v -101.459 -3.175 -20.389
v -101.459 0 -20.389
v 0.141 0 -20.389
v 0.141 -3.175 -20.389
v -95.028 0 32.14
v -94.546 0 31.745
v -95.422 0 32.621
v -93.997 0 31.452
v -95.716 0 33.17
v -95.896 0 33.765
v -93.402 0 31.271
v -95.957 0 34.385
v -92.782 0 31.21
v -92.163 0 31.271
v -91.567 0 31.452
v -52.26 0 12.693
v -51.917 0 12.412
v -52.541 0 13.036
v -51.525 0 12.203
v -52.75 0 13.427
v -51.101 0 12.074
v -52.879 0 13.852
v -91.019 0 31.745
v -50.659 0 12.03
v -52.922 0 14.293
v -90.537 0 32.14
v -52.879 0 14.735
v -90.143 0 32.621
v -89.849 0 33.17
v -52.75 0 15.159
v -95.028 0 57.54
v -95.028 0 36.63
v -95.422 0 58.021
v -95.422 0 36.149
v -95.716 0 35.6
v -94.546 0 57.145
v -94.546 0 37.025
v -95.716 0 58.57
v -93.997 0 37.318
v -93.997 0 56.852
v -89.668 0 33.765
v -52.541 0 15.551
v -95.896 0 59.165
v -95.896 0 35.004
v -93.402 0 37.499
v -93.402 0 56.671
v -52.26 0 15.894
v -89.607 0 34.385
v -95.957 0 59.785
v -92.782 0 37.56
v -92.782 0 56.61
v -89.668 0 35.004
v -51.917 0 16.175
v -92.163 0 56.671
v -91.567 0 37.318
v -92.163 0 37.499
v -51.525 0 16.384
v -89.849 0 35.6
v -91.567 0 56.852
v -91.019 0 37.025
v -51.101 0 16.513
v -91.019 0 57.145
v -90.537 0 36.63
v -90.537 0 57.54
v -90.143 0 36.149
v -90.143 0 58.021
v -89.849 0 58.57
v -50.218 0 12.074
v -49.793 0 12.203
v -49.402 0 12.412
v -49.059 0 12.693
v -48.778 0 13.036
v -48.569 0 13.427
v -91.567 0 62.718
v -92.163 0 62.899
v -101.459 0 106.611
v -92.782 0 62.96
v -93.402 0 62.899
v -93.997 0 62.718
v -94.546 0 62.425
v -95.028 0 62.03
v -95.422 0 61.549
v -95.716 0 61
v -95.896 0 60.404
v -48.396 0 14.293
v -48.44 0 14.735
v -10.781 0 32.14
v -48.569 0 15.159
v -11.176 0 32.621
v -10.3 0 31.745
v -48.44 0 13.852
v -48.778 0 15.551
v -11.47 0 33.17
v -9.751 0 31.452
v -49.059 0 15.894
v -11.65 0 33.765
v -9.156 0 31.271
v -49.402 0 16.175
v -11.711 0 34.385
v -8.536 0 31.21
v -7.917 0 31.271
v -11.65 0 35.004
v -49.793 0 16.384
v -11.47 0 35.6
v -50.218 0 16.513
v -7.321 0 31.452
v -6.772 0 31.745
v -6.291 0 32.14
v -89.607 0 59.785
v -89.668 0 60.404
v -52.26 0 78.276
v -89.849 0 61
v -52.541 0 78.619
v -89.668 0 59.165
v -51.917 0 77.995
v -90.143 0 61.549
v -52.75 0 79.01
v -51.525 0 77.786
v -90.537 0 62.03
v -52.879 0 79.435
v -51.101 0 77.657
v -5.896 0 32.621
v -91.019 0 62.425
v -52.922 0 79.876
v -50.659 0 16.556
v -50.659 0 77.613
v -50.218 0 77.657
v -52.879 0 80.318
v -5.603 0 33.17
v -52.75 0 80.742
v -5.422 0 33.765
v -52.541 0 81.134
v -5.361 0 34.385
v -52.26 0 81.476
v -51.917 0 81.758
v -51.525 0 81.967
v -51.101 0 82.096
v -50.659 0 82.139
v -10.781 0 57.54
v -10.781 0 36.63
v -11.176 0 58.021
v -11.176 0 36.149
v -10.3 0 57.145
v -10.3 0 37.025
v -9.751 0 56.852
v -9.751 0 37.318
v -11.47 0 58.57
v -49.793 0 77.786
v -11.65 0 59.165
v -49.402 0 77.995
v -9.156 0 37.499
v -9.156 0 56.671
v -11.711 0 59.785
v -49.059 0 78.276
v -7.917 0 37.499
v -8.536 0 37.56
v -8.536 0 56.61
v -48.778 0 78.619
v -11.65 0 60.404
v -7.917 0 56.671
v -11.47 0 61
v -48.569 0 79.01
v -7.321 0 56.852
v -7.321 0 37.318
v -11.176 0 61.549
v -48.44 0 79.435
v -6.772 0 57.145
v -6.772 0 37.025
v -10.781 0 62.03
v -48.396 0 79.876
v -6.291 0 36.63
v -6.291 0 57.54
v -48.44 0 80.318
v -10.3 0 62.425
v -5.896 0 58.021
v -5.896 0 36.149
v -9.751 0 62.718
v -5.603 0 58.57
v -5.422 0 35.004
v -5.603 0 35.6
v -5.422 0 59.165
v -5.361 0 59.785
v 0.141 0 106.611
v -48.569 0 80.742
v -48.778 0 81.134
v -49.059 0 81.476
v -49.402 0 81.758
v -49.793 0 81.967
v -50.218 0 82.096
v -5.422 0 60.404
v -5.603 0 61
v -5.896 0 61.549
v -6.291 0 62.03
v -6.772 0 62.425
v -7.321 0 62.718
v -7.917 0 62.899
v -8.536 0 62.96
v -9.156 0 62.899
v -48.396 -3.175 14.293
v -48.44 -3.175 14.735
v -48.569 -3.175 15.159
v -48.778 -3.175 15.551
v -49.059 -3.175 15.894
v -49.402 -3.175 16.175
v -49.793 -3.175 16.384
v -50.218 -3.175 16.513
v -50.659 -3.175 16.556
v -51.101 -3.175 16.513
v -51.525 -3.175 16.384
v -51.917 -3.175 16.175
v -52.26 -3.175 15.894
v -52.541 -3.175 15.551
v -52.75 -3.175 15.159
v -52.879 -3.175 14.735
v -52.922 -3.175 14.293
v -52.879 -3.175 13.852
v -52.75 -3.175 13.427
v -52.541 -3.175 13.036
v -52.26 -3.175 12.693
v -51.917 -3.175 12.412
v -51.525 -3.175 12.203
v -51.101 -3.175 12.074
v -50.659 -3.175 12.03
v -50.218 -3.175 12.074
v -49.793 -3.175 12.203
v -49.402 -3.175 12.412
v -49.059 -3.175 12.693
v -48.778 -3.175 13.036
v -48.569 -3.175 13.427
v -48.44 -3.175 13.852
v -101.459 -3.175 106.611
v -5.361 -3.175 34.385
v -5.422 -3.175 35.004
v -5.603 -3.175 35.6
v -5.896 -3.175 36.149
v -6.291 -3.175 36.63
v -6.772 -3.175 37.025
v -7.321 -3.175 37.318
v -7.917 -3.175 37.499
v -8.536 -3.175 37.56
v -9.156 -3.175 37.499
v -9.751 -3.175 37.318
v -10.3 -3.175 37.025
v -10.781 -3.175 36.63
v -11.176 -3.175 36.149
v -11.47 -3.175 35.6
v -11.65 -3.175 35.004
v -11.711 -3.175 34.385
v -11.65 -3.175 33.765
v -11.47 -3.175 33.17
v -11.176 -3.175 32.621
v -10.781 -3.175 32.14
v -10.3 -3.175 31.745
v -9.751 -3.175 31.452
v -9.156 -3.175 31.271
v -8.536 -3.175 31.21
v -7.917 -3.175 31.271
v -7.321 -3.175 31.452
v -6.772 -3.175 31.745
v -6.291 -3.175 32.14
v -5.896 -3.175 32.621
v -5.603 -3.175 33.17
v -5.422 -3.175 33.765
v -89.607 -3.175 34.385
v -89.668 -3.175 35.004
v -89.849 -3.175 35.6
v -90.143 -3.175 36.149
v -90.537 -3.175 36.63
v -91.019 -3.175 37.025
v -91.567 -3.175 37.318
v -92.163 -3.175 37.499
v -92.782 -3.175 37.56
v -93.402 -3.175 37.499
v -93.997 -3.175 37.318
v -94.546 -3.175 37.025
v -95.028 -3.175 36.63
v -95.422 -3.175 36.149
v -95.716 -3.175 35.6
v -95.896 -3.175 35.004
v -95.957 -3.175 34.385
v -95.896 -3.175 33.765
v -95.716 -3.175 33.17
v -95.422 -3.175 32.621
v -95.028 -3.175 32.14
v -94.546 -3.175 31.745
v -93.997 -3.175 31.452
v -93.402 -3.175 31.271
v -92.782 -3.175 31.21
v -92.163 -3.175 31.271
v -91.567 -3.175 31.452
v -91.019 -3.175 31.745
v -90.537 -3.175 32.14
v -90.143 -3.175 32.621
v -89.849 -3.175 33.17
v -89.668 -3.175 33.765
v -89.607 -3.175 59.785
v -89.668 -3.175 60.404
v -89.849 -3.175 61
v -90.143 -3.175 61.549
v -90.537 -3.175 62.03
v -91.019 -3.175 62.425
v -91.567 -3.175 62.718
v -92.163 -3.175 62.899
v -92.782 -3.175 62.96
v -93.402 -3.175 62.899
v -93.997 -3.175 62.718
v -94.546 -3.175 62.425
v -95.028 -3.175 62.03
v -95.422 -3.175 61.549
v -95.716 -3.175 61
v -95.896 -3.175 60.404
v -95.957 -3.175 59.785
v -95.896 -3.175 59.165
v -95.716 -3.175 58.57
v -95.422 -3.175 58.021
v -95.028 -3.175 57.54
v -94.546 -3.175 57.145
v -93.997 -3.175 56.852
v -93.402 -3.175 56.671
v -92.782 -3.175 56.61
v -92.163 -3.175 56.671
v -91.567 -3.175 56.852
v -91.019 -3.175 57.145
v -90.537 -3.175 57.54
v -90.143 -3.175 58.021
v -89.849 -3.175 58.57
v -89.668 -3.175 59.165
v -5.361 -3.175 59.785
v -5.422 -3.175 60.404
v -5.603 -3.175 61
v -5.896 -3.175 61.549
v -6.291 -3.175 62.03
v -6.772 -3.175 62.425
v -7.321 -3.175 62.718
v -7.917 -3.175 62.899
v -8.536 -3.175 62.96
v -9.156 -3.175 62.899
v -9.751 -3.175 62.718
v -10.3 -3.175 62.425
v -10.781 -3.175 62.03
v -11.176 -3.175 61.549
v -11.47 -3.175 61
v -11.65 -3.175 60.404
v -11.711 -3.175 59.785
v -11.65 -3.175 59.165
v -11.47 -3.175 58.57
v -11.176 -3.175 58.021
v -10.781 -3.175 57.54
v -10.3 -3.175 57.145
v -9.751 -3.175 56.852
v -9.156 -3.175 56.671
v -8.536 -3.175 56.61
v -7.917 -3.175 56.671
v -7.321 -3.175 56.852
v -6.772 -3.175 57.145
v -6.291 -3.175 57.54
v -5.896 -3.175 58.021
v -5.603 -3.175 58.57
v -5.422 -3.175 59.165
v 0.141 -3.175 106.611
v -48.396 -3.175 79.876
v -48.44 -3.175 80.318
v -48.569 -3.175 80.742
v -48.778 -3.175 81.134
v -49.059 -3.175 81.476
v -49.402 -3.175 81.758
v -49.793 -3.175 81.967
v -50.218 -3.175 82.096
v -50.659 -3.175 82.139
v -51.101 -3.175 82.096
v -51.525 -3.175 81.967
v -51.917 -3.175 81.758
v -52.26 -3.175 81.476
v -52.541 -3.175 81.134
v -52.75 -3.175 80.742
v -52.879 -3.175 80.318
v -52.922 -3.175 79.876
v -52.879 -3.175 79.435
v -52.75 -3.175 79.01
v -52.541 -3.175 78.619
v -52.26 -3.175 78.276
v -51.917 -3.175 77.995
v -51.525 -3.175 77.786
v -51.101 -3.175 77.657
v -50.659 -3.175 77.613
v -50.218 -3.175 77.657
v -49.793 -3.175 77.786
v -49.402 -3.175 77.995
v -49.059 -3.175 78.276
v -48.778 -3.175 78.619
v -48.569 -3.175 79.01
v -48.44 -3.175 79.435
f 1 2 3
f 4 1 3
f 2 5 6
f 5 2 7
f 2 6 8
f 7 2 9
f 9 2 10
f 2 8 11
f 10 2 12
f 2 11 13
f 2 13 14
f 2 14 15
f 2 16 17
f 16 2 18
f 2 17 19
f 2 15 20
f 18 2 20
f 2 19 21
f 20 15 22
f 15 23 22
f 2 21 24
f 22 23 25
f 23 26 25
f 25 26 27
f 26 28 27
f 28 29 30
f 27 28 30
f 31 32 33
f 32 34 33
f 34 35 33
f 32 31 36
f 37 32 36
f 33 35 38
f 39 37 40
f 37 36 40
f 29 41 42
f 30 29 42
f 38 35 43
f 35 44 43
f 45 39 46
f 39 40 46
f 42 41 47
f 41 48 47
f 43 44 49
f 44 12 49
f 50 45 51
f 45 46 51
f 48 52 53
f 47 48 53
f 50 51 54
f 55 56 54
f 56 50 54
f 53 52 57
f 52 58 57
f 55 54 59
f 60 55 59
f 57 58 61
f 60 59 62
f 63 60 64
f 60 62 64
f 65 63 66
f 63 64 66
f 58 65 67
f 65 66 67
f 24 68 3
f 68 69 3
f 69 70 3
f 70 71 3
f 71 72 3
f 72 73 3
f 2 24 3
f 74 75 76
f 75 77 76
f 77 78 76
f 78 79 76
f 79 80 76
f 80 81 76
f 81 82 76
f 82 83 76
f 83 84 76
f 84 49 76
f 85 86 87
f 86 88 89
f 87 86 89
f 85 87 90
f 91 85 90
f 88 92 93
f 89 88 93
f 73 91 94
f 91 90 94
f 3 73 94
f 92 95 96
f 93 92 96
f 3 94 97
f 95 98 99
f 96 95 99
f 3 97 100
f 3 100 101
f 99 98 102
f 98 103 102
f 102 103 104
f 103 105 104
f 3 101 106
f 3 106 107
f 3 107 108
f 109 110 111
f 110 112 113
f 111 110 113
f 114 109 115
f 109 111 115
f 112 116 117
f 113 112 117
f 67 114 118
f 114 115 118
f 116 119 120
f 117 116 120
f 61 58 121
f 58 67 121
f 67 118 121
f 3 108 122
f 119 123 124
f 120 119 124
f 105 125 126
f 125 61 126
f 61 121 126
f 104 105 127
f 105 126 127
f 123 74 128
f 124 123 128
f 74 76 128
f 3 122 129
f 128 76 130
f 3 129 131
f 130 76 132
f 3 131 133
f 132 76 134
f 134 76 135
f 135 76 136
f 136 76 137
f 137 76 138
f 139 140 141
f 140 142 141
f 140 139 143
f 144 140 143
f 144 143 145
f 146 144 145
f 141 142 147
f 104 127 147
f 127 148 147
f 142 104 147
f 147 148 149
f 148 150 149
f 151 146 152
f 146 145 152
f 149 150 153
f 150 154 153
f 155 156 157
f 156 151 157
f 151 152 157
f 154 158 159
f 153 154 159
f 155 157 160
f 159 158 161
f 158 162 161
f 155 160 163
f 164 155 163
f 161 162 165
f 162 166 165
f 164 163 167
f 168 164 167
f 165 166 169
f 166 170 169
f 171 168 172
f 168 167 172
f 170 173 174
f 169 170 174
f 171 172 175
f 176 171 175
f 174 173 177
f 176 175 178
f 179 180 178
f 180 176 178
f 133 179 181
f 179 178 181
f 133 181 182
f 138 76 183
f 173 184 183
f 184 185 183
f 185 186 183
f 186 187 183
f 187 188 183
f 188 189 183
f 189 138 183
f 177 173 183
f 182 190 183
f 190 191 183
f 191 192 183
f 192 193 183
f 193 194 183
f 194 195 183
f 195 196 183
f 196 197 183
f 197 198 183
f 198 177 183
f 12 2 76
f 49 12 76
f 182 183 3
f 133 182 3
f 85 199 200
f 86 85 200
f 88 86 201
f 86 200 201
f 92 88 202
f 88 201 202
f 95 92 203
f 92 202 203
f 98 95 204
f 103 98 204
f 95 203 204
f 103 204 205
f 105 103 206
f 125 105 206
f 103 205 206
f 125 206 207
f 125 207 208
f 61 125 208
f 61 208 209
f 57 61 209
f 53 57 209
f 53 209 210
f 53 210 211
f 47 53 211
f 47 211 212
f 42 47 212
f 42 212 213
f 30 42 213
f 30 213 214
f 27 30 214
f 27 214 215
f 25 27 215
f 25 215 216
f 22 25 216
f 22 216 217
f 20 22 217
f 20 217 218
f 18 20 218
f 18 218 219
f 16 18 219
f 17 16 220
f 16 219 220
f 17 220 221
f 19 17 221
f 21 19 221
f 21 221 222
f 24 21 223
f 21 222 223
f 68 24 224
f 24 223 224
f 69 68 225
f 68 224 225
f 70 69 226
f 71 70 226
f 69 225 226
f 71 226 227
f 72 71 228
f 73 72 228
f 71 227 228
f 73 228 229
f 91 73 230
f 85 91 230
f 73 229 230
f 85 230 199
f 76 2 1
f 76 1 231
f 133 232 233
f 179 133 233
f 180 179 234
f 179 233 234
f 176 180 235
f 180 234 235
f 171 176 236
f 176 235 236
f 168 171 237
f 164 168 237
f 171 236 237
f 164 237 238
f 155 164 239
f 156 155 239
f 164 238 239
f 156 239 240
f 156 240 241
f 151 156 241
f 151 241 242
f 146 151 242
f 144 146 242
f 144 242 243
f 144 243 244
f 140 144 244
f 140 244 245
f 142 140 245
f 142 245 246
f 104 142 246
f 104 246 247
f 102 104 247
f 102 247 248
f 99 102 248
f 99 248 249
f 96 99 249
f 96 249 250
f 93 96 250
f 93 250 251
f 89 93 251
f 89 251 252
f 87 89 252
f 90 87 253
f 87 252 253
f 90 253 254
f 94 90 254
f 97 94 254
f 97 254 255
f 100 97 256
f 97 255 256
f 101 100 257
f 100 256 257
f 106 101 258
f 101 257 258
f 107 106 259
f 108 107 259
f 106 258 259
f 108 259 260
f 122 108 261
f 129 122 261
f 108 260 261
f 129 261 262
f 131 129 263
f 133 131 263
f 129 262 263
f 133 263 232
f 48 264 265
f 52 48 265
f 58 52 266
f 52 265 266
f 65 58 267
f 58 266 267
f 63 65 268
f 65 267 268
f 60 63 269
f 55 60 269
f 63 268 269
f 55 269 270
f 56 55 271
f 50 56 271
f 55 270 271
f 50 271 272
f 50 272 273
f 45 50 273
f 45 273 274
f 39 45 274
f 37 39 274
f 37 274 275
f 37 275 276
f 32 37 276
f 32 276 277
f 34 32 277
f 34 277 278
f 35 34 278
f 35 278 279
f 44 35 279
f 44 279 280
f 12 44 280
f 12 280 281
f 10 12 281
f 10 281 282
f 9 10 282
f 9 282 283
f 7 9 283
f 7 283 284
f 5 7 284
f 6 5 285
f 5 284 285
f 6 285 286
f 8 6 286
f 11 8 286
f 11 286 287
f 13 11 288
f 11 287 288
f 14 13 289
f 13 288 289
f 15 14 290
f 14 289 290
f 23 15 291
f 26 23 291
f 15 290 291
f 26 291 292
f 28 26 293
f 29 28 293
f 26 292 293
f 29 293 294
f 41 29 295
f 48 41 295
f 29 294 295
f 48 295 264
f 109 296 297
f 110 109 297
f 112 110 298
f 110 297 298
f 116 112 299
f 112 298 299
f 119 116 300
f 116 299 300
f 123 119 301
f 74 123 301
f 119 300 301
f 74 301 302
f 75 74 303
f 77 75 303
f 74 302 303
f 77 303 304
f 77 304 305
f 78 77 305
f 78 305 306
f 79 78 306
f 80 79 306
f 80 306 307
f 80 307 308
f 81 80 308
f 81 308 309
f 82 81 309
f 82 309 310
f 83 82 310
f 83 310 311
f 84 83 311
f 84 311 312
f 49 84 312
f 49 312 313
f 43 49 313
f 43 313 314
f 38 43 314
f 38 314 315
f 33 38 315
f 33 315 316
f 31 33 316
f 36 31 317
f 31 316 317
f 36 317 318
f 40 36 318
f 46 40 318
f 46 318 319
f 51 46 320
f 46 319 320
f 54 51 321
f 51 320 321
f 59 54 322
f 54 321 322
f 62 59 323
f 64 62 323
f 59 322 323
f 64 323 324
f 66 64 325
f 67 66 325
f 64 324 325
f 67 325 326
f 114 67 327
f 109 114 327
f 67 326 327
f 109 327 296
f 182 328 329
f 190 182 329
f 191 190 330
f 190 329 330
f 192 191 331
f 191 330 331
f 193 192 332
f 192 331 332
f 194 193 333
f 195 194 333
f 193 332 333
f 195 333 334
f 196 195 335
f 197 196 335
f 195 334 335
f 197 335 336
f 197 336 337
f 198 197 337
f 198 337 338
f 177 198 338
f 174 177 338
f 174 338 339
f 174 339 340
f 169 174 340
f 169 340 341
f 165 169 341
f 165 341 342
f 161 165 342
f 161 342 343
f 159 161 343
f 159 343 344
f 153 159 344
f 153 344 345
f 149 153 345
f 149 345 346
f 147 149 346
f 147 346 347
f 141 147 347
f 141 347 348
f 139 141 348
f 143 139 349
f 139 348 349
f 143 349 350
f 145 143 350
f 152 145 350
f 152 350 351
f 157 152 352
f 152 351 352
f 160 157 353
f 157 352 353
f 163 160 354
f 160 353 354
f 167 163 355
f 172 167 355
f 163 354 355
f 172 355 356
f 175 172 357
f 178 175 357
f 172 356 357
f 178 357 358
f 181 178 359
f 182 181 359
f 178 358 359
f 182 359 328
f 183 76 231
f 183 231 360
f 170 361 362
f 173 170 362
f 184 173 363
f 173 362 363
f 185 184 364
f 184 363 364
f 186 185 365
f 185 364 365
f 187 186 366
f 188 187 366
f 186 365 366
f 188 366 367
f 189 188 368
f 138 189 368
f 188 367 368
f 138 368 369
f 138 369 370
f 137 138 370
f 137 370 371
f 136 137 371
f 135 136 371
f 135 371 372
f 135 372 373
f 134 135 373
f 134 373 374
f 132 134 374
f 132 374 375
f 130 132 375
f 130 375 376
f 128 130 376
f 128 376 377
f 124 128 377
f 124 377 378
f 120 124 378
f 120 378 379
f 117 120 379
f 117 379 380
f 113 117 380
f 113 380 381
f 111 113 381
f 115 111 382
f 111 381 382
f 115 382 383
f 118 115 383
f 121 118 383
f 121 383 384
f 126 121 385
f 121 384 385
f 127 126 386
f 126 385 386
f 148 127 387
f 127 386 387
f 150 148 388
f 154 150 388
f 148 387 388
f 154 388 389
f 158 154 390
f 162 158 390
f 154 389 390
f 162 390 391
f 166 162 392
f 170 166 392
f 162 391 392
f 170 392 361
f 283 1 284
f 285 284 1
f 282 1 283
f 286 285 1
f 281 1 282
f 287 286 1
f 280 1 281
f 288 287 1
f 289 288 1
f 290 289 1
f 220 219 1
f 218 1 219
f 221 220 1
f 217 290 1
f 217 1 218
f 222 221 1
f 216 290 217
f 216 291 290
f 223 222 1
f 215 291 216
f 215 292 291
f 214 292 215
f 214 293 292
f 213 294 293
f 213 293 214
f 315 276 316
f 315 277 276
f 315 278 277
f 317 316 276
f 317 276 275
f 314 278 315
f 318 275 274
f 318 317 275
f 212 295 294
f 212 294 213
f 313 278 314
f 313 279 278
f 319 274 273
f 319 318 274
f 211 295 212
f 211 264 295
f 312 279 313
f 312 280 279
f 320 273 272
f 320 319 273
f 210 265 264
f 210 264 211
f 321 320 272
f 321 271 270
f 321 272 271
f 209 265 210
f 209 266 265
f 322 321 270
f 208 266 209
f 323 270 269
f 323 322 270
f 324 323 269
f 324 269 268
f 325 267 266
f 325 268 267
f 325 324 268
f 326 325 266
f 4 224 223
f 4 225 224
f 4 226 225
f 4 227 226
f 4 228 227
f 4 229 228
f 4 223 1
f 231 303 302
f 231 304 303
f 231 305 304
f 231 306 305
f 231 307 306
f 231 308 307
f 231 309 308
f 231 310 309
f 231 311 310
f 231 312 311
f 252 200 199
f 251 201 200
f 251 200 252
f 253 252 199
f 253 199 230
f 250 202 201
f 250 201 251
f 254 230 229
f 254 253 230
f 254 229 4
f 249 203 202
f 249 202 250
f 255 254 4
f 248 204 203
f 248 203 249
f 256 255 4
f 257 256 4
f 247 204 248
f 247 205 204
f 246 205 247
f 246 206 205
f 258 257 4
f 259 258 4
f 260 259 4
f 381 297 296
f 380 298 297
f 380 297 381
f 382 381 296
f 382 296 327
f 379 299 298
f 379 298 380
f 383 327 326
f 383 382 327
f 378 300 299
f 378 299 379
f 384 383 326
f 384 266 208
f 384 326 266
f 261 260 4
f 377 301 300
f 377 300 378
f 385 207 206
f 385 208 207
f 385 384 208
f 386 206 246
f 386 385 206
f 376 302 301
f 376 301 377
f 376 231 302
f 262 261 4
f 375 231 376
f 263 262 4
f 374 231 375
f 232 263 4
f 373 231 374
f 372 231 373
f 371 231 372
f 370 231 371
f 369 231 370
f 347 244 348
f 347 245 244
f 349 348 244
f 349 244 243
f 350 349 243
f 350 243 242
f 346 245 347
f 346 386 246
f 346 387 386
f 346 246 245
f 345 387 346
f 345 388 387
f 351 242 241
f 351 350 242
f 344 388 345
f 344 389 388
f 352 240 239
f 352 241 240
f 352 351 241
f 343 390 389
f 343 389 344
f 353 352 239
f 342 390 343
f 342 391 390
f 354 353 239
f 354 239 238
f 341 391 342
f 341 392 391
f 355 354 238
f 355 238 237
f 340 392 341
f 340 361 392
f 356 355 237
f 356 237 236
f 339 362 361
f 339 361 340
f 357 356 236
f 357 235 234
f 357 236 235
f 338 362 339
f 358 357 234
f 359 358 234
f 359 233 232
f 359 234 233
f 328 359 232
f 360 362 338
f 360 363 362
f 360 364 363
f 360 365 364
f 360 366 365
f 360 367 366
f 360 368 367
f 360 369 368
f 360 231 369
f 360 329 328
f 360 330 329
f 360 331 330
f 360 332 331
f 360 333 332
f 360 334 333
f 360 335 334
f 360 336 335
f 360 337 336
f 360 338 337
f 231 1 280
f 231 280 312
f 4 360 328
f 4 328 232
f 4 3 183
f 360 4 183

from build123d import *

# Parameters (mm, degrees)
F0_W     = 101.6
F0_H     = 127
F1_DEPTH = 3.175
F2_R     = 2.263003
F3_DEPTH = 3.176
F4_R     = 3.175
F5_DEPTH = 3.176


with BuildPart() as f1:
    # F0 (on Front) → F1 (new body)
    with BuildSketch(Plane.XZ):
        with Locations((-50.659383, 43.110808)):
            Rectangle(F0_W, F0_H)
    extrude(amount=F1_DEPTH)

    # F2 (on face) → F3 (cut, through all)
    with BuildSketch(Plane.XZ.offset(3.175)):
        with Locations((-50.659383, 79.876246)):
            Circle(F2_R)
        with Locations((-50.659383, 14.293446)):
            Circle(F2_R)
    extrude(amount=-F3_DEPTH, mode=Mode.SUBTRACT)

    # F4 (on face) → F5 (cut, through all)
    with BuildSketch(Plane.XZ.offset(3.175)):
        with Locations((-92.782468, 59.784846)):
            Circle(F4_R)
        with Locations((-92.782468, 34.384846)):
            Circle(F4_R)
        with Locations((-8.536297, 34.384846)):
            Circle(F4_R)
        with Locations((-8.536297, 59.784846)):
            Circle(F4_R)
    extrude(amount=-F5_DEPTH, mode=Mode.SUBTRACT)


solid = f1.part
